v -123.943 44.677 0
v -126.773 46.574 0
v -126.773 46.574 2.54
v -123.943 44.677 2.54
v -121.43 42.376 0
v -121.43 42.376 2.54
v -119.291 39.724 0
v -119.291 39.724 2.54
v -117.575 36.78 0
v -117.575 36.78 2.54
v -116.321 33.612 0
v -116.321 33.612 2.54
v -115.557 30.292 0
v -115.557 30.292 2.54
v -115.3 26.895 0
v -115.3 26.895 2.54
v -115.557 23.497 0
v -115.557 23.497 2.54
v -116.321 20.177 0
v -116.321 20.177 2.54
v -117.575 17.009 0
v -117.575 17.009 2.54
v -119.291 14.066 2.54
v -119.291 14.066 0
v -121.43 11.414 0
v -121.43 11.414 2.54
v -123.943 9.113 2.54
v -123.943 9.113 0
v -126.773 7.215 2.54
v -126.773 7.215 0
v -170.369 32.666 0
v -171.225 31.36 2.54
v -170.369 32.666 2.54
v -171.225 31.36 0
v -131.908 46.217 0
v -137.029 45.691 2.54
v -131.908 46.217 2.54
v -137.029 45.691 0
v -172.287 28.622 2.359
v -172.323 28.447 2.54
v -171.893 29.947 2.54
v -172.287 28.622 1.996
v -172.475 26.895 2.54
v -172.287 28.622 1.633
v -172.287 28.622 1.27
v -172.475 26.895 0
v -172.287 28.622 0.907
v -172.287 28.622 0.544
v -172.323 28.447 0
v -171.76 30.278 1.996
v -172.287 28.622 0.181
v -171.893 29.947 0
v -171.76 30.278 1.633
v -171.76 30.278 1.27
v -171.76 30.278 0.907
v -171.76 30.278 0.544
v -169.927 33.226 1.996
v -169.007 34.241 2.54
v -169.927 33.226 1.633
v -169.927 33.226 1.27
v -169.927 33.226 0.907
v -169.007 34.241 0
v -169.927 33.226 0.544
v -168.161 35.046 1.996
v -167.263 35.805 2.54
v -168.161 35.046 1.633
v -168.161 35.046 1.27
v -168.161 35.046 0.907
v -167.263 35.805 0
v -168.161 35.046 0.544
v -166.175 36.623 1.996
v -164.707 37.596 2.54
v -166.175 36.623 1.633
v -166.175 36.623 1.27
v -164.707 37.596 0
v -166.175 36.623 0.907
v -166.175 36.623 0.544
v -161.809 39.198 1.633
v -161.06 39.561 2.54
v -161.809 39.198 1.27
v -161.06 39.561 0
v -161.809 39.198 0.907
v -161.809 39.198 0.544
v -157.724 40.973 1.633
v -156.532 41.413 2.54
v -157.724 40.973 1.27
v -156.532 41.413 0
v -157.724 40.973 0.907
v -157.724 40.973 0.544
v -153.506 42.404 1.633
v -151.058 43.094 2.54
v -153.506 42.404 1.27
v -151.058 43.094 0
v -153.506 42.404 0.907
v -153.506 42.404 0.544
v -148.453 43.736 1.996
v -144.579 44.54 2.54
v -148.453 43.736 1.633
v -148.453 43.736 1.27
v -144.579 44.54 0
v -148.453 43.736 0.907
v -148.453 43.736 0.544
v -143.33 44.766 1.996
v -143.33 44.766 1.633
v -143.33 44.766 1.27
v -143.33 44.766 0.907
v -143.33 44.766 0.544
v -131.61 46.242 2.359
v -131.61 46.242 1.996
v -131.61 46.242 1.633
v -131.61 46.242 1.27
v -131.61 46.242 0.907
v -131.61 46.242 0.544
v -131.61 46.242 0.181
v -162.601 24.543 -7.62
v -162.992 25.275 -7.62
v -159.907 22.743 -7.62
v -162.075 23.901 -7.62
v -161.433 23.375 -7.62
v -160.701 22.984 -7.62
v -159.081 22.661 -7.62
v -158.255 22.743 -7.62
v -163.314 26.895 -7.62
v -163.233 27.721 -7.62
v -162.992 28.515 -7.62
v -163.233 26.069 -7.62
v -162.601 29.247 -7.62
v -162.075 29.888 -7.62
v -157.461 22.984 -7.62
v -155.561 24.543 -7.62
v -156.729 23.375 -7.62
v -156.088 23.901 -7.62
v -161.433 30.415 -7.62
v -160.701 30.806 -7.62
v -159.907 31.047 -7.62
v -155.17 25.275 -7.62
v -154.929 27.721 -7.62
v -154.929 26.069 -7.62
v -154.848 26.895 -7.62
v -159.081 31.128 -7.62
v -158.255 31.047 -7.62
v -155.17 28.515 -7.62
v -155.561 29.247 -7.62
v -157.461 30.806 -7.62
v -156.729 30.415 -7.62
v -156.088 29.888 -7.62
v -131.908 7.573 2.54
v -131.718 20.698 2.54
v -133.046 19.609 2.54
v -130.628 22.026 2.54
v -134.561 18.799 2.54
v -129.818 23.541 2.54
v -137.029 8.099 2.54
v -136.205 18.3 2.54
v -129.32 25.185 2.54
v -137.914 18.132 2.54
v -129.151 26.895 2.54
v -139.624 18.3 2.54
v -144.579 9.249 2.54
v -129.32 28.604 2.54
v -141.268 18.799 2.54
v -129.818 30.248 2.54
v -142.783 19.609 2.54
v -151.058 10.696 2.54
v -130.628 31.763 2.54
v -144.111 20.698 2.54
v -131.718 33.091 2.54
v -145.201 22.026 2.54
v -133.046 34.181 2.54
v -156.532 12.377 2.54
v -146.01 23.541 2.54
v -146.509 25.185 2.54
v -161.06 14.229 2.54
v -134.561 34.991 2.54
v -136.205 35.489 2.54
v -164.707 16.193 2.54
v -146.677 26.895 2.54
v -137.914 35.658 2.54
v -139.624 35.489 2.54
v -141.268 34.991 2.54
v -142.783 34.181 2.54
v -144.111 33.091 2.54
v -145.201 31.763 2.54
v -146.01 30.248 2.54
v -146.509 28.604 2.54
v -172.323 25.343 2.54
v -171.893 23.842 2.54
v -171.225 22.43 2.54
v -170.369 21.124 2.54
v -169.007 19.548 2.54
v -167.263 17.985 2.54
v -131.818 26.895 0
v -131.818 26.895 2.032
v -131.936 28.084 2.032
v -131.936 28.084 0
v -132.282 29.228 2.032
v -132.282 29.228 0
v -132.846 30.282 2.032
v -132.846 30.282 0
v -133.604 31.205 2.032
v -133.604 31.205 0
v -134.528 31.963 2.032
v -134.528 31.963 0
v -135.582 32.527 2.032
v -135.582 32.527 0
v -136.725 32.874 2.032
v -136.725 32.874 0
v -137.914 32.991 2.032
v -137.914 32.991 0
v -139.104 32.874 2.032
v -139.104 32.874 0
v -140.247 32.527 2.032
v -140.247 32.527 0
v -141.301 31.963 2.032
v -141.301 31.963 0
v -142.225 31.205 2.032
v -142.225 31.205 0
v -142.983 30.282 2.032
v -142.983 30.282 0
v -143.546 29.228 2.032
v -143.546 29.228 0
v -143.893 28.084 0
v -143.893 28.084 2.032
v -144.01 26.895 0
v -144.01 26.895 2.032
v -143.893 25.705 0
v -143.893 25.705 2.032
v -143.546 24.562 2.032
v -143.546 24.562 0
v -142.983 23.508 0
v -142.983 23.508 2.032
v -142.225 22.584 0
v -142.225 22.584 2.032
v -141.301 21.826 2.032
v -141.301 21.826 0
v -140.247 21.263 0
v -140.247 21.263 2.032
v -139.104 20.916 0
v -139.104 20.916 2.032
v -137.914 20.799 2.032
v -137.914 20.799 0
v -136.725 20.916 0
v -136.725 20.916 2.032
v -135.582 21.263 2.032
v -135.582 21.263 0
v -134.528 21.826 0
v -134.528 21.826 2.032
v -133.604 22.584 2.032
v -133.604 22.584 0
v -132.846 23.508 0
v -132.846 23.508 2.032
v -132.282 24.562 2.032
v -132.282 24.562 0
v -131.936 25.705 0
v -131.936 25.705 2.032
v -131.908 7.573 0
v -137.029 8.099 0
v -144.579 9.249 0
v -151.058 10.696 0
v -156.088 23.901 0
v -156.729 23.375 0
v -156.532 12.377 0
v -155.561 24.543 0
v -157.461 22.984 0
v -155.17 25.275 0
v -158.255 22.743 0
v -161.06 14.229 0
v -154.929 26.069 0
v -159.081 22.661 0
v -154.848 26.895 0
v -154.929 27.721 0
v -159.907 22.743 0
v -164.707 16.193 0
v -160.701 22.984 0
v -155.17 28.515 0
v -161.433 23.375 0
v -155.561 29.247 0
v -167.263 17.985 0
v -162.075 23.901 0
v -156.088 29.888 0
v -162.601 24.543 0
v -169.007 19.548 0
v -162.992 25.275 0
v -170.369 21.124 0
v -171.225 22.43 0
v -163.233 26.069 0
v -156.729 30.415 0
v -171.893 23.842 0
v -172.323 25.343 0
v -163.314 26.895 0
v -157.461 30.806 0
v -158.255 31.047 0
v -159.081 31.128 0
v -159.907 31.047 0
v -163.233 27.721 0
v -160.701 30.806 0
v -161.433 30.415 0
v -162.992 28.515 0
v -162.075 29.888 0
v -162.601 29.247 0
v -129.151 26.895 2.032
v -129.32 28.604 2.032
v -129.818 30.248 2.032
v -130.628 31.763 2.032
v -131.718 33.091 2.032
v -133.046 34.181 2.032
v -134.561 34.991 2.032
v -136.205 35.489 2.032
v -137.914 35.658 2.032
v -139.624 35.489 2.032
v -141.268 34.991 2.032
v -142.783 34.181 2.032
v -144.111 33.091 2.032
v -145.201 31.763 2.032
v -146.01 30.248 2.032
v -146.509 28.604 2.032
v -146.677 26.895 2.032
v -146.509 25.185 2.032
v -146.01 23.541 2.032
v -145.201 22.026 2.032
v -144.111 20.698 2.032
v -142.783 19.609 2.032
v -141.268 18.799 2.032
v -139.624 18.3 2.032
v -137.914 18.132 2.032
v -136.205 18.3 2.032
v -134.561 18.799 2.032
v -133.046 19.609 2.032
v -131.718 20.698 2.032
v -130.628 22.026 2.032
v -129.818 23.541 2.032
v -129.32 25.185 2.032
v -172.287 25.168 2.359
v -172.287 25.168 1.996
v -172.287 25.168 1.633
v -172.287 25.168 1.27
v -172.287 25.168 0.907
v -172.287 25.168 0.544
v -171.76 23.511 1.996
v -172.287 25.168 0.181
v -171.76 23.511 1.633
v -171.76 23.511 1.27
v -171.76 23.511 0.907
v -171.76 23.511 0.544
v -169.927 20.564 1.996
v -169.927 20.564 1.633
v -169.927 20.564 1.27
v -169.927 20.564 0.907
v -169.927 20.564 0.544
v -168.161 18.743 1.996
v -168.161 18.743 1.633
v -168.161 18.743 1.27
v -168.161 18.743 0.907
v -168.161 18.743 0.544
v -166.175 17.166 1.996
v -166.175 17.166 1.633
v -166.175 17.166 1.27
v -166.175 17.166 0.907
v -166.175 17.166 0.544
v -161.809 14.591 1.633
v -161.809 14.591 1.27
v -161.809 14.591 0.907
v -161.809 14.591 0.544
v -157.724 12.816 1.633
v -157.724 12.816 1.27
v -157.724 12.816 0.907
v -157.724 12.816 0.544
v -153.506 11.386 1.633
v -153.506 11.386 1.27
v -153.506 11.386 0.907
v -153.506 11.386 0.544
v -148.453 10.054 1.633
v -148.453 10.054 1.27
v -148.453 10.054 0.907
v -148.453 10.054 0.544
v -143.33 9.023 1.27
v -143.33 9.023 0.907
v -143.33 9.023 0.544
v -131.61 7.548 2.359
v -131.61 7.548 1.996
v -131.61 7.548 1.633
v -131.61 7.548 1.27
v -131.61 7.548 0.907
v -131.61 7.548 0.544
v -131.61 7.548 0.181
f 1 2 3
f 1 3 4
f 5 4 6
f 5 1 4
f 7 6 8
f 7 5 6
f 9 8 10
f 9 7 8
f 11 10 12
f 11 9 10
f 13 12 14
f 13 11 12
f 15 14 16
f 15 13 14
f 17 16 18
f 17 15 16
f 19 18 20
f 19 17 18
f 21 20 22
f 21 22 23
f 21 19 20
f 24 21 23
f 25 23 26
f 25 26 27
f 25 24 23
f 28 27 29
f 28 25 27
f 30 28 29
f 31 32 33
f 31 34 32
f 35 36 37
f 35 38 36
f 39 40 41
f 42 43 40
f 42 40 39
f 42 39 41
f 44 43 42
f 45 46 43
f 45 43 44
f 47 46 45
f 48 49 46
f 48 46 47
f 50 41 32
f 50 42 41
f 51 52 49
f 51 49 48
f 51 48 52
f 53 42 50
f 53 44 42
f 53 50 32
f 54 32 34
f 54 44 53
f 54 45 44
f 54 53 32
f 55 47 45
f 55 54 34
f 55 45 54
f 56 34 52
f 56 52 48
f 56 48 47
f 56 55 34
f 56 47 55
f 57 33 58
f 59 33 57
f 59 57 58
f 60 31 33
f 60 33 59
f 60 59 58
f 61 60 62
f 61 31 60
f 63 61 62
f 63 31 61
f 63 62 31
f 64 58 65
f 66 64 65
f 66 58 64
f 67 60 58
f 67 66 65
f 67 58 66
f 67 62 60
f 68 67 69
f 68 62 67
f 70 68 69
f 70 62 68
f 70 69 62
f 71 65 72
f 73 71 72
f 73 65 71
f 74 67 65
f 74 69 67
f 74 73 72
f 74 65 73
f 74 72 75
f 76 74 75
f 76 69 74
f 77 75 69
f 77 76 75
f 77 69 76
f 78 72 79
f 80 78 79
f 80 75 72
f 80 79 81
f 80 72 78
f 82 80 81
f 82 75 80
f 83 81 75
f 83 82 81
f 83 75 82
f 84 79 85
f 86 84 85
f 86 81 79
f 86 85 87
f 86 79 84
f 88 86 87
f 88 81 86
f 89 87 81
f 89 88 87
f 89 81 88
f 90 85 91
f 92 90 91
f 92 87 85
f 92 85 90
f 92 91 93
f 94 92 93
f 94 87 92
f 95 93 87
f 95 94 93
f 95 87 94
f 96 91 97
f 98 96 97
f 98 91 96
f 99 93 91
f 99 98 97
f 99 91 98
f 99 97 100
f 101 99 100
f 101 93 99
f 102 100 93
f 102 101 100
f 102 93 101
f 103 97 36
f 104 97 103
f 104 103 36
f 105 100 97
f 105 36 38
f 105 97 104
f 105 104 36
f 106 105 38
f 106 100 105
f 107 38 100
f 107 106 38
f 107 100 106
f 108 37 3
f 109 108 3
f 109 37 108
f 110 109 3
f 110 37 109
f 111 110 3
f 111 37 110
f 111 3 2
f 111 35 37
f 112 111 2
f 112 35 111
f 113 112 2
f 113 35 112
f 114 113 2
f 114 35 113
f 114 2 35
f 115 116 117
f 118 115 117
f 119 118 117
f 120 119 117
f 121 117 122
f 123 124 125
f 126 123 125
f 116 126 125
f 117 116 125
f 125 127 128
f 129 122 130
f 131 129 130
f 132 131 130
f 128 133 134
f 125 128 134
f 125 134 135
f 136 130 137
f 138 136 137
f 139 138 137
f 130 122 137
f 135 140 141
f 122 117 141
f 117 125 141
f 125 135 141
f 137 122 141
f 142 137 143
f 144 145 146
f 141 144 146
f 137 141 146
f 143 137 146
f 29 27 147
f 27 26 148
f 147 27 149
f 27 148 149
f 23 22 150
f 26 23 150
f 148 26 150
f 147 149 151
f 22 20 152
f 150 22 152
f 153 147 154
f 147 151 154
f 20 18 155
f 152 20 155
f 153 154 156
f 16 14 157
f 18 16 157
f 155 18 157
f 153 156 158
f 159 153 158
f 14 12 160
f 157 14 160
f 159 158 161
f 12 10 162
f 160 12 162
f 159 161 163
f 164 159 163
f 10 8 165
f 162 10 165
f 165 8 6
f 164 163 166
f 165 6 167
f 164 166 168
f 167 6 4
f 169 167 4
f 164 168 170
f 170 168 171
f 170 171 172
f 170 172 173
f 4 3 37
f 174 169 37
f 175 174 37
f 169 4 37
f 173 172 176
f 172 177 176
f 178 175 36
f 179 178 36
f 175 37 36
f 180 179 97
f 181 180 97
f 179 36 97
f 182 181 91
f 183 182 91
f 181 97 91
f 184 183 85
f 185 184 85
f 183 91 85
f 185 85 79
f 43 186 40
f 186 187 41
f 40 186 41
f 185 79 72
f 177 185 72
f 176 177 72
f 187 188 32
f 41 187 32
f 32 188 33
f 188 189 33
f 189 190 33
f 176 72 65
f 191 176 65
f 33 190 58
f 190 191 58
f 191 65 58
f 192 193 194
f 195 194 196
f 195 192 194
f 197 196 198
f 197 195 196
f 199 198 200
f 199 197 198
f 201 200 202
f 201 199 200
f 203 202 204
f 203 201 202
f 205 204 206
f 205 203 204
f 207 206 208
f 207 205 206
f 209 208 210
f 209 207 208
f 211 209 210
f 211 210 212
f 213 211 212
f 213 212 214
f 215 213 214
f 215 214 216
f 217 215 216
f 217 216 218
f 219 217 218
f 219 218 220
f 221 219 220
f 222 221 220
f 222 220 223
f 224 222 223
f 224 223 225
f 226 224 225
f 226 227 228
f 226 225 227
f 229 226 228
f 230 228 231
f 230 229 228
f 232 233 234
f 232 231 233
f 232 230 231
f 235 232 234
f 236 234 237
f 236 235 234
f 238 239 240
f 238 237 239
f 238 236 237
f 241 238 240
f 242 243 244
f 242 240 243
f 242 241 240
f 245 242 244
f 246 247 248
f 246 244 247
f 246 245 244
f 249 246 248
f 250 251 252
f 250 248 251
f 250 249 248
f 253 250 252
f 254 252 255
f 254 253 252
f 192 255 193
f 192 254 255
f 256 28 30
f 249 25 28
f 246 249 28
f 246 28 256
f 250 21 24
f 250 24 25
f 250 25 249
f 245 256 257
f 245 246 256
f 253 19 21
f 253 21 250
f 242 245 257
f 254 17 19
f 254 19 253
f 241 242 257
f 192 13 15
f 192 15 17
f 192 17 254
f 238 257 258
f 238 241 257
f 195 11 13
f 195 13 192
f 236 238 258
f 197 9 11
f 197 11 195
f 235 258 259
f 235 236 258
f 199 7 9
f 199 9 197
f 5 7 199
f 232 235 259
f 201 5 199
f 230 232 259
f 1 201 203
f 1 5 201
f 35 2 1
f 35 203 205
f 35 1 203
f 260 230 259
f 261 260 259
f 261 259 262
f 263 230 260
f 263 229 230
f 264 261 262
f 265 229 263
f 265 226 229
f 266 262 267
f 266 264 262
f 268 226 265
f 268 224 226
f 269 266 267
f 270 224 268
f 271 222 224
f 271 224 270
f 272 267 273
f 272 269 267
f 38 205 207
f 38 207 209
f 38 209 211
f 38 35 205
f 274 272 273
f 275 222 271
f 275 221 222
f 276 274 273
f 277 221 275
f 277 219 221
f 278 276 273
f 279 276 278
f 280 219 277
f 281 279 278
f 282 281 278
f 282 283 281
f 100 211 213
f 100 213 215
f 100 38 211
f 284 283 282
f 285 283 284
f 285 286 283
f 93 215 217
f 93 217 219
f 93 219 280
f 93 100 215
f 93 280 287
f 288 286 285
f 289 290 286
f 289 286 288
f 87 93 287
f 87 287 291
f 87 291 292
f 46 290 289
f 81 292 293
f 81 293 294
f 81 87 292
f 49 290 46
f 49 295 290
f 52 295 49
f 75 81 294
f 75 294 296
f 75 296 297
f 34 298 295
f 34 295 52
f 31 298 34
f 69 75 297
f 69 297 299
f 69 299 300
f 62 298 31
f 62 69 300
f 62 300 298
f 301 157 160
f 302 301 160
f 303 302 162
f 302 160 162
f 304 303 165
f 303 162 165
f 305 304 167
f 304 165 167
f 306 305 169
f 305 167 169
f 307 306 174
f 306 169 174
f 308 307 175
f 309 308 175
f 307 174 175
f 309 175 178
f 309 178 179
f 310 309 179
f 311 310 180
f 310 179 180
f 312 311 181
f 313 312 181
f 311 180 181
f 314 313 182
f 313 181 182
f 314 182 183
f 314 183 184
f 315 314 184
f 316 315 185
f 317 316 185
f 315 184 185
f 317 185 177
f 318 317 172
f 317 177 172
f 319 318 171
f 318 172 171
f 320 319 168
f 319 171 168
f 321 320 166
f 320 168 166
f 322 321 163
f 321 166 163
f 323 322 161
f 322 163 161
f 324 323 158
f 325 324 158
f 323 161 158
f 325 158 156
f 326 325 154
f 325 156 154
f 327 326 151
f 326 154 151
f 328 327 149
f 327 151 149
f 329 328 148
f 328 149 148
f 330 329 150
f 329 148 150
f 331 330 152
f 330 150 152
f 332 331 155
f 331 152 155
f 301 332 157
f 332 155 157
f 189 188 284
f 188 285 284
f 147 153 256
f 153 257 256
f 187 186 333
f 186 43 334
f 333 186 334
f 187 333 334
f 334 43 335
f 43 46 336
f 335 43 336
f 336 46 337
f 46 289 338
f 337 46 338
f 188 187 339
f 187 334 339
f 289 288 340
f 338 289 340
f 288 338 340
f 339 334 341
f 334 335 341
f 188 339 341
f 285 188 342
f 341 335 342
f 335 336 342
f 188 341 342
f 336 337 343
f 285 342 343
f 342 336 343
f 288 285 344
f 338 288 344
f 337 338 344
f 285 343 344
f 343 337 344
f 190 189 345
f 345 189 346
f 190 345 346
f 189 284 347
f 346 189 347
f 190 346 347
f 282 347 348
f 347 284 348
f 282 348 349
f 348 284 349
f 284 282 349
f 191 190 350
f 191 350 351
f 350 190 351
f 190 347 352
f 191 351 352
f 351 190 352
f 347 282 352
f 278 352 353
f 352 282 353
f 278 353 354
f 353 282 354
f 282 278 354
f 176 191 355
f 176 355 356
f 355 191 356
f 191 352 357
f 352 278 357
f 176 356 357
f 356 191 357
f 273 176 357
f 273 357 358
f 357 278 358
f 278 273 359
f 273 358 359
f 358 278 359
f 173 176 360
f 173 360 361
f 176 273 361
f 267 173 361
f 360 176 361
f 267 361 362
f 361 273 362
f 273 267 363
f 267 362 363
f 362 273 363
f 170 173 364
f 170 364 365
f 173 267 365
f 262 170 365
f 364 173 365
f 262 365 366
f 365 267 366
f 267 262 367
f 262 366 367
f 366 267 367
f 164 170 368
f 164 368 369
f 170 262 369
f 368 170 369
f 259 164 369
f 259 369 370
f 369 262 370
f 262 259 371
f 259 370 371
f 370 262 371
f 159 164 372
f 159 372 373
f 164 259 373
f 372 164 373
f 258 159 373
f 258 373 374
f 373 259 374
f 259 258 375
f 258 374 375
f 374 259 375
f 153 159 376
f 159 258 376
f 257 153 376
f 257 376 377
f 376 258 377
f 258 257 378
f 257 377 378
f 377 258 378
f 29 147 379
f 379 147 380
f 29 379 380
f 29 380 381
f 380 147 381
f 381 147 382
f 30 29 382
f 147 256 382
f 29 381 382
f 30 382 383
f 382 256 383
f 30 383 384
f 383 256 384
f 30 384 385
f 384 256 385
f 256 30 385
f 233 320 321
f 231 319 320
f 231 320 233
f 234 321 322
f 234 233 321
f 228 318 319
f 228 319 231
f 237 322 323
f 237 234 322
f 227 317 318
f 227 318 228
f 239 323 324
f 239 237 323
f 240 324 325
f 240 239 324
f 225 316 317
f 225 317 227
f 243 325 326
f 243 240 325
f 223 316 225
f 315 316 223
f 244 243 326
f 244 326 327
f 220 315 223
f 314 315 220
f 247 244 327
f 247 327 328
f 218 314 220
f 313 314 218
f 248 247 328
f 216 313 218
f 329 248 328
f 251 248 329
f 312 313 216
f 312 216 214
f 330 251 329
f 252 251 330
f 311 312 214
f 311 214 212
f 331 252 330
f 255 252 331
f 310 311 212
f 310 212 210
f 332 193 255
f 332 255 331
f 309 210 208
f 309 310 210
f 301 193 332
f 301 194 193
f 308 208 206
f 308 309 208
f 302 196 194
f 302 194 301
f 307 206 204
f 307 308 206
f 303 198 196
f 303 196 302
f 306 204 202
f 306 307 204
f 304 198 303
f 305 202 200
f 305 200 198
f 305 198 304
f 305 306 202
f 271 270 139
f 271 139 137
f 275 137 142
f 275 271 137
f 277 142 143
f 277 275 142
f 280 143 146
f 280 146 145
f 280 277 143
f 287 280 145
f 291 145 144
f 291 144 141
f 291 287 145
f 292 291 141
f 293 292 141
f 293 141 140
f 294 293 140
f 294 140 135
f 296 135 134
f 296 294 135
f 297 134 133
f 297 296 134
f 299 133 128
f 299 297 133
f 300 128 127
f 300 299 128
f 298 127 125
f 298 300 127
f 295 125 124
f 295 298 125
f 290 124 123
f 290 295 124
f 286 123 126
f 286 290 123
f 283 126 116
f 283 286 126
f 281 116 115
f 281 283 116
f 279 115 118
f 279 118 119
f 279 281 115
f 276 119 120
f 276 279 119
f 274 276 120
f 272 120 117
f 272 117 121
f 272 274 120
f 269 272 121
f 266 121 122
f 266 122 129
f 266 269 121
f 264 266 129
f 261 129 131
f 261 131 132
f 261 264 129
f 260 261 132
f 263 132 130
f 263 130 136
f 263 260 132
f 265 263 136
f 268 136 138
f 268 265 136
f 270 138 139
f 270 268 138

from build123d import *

# Parameters (mm, degrees)
BOSS_EXTRUDE2_DEPTH = 2.54
SKETCH1_5_R         = 4.233333332
BOSS_EXTRUDE3_DEPTH = 7.62
SKETCH1_6_R         = 6.096
CUT_EXTRUDE1_DEPTH  = 179.814895395
SKETCH4_R           = 8.763
CUT_EXTRUDE2_DEPTH  = 0.508


with BuildPart() as part:
    # Sketch1 → Boss-Extrude2 (new body)
    with BuildSketch(Plane.XY):
        with BuildLine():
            ThreePointArc((-126.772670279, 7.21547203), (-115.299991188, 26.89475243), (-126.772670279, 46.57403283))
            add(Edge.make_bspline(
                [(-172.474815081, 26.89475243), (-172.473819891, 27.230973869), (-172.419747256, 28.067223274), (-172.09778315, 29.537851691), (-171.305841422, 31.369969831), (-169.889362805, 33.399100842), (-167.799877065, 35.466403756), (-165.058549528, 37.462309128), (-161.711634876, 39.321499724), (-157.809164116, 41.006194136), (-153.398533523, 42.494070588), (-148.523738699, 43.77188575), (-143.225981342, 44.832188047), (-137.544438785, 45.671493001), (-132.01714462, 46.238870937), (-128.386674126, 46.485977046), (-126.772670279, 46.57403283)],
                knots=[0.5, 0.5, 0.5, 0.5, 0.502166769, 0.505390167, 0.509655974, 0.514947682, 0.521244711, 0.528520886, 0.536744945, 0.54588136, 0.555890751, 0.566730119, 0.57835299, 0.590709588, 0.603747039, 0.614168613, 0.614168613, 0.614168613, 0.614168613], degree=3))
            add(Edge.make_bspline(
                [(-172.474815081, 26.89475243), (-172.473819891, 26.558530991), (-172.419747256, 25.722281586), (-172.09778315, 24.251653169), (-171.305841422, 22.419535029), (-169.889362805, 20.390404018), (-167.799877065, 18.323101104), (-165.058549527, 16.327195732), (-161.711634875, 14.468005136), (-157.809164116, 12.783310723), (-153.398533522, 11.295434272), (-148.523738698, 10.01761911), (-143.225981341, 8.957316813), (-137.544438784, 8.118011859), (-132.01714462, 7.550633923), (-128.386674126, 7.303527814), (-126.772670279, 7.21547203)],
                knots=[0.5, 0.5, 0.5, 0.5, 0.502166769, 0.505390167, 0.509655974, 0.514947682, 0.521244711, 0.528520886, 0.536744945, 0.54588136, 0.555890751, 0.566730119, 0.57835299, 0.590709588, 0.603747039, 0.614168613, 0.614168613, 0.614168613, 0.614168613], degree=3))
        make_face()
    extrude(amount=BOSS_EXTRUDE2_DEPTH)

    # Sketch1<5> → Boss-Extrude3 (add)
    with BuildSketch(Plane.XY):
        with Locations((-159.081098581, 26.89475243)):
            Circle(SKETCH1_5_R)
    extrude(amount=-BOSS_EXTRUDE3_DEPTH)

    # Sketch1<6> → Cut-Extrude1 (cut, through all)
    with BuildSketch(Plane.XY):
        with Locations((-137.914431916, 26.89475243)):
            Circle(SKETCH1_6_R)
    extrude(amount=CUT_EXTRUDE1_DEPTH, mode=Mode.SUBTRACT)

    # Sketch4 → Cut-Extrude2 (cut)
    with BuildSketch(Plane.XY.offset(2.54)):
        with Locations((-137.914431916, 26.89475243)):
            Circle(SKETCH4_R)
    extrude(amount=-CUT_EXTRUDE2_DEPTH, mode=Mode.SUBTRACT)


solid = part.part
